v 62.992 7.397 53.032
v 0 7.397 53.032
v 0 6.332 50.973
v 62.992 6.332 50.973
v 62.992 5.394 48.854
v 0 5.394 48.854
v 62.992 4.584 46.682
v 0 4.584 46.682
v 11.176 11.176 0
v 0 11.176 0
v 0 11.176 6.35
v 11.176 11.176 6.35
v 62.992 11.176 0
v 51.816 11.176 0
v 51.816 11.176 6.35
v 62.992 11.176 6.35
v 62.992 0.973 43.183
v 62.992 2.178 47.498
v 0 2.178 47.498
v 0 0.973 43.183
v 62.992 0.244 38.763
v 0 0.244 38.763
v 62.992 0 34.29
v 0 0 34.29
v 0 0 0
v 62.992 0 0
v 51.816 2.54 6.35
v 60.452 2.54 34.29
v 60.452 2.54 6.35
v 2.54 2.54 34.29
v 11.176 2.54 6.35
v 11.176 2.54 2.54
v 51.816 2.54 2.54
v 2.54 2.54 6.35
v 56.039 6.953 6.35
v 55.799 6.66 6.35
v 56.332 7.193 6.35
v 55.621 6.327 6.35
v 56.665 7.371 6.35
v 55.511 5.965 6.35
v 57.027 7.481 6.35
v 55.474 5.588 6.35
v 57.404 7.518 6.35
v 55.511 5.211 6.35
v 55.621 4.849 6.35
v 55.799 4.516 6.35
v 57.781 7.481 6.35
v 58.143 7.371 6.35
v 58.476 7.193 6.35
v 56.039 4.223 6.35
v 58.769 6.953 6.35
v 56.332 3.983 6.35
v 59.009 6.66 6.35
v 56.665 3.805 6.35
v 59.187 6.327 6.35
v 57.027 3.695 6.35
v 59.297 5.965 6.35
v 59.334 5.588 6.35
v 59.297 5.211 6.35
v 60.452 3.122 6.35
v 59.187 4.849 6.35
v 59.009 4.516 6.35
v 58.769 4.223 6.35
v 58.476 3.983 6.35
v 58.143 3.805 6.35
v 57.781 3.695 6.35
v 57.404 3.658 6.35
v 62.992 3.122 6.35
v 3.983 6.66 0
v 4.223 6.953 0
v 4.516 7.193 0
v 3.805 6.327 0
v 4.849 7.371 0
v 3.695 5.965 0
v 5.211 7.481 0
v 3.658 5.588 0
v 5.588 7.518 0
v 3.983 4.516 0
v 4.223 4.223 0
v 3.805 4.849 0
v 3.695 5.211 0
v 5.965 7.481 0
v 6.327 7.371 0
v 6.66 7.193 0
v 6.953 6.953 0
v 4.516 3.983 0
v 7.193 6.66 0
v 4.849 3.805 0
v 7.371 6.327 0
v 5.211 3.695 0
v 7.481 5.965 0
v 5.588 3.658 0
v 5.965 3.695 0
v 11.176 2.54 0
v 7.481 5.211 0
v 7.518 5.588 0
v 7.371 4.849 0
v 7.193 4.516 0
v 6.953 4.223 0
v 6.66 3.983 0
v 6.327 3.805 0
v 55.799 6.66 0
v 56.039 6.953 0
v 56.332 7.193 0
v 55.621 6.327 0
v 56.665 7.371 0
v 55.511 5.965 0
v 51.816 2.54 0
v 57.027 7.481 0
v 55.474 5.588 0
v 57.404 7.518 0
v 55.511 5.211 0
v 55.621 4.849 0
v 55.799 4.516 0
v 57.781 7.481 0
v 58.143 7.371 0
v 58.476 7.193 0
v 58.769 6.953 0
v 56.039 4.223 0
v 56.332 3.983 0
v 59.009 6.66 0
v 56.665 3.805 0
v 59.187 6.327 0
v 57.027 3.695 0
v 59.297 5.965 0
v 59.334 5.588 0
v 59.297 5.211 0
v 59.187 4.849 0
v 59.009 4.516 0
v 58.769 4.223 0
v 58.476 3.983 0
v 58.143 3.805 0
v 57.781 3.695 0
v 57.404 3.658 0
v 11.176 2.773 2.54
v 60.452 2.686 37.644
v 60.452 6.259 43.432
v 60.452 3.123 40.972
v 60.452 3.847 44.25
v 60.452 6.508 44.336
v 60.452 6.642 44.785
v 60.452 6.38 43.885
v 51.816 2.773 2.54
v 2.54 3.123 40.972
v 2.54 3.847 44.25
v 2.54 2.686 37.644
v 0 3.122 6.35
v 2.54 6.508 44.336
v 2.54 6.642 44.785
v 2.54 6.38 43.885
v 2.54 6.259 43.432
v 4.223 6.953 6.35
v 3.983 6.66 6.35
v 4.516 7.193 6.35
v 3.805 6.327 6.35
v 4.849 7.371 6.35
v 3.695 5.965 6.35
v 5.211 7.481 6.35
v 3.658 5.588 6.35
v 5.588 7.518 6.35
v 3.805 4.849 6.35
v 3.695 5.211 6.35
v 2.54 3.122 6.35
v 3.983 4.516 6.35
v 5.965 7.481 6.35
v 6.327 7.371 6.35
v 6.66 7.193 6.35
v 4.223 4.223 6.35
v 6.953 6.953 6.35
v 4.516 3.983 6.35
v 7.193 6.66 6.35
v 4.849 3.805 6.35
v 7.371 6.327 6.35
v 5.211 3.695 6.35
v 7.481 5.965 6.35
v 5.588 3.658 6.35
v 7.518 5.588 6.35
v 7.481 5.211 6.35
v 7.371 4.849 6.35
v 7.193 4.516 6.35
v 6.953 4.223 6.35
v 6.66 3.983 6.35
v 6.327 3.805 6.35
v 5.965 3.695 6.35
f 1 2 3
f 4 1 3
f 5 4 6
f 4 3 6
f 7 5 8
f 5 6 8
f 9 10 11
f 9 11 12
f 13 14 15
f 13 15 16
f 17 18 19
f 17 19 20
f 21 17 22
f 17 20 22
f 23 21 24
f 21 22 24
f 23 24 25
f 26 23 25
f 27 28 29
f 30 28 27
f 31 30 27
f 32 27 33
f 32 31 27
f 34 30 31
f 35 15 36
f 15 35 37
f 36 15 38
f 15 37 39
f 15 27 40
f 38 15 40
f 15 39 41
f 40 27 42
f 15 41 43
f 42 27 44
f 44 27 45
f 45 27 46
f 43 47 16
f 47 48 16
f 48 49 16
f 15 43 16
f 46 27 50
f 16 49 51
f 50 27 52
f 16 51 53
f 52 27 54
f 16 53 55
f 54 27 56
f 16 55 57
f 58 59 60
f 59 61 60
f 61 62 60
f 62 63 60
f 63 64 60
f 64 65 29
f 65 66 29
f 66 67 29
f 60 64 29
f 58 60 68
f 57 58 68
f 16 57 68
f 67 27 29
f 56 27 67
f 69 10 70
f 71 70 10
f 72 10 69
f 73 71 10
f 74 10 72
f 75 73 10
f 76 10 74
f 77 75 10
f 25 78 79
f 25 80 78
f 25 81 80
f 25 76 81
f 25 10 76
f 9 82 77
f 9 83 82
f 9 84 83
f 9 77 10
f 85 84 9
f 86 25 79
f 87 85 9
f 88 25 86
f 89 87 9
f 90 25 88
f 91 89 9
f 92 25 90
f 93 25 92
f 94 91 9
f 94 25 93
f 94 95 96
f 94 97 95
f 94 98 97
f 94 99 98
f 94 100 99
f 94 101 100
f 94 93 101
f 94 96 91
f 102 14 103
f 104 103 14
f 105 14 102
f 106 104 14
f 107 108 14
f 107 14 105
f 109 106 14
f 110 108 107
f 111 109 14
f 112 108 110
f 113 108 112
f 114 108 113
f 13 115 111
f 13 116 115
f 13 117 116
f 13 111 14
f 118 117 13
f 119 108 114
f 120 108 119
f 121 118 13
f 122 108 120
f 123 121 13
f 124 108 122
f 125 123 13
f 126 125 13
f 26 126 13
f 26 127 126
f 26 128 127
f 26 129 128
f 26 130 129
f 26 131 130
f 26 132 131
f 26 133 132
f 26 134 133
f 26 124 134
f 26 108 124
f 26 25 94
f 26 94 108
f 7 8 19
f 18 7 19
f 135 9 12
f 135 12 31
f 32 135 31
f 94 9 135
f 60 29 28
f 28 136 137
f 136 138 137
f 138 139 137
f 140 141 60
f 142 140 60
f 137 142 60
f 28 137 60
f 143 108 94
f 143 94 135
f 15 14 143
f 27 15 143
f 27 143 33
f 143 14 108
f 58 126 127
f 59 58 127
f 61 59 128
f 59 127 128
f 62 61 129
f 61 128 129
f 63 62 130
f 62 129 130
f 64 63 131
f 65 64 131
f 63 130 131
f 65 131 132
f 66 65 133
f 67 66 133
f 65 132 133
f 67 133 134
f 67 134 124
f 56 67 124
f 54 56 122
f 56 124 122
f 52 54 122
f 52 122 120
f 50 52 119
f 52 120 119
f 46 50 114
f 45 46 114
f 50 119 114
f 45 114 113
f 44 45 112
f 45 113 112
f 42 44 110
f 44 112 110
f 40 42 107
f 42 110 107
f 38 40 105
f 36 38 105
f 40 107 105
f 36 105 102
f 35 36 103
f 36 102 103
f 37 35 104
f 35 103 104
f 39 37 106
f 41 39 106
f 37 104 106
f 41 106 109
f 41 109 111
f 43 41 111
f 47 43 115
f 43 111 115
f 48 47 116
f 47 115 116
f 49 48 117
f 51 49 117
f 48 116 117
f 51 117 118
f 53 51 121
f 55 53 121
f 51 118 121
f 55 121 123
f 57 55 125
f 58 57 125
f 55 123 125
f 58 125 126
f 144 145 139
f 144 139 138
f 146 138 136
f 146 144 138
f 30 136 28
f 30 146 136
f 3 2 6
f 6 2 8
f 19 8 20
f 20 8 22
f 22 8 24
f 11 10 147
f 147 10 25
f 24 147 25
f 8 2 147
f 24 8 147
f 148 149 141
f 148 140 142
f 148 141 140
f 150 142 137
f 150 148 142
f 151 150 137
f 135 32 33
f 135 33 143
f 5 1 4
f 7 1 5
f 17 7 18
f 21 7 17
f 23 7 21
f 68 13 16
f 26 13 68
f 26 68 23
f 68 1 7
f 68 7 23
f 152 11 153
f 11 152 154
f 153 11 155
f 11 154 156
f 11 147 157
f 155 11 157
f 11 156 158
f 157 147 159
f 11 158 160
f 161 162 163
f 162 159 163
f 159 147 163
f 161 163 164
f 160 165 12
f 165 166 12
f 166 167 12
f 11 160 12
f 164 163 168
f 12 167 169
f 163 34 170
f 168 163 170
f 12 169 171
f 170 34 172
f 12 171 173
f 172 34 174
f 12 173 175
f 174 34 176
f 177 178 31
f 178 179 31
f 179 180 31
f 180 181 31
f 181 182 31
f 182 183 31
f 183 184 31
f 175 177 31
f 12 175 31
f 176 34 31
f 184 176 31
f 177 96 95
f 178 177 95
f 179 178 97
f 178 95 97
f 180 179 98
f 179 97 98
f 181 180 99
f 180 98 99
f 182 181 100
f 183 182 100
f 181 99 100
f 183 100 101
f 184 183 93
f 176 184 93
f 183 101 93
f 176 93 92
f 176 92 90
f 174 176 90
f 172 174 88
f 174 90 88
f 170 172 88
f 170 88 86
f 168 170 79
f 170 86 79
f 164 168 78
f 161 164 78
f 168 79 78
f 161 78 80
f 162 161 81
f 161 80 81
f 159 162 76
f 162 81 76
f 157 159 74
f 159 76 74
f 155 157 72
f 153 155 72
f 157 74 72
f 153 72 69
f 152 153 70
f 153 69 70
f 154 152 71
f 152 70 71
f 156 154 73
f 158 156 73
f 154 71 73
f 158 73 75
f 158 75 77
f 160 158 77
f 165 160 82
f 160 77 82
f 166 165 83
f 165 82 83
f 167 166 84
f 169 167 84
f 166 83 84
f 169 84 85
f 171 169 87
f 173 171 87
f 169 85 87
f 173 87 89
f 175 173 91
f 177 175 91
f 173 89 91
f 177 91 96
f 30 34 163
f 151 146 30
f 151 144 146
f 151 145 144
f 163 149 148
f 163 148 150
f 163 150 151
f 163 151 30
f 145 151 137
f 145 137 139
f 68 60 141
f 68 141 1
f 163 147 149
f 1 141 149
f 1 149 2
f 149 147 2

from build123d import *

# Parameters (mm, degrees)
F1_DEPTH = 62.992
F2_T     = -2.54
F3_W     = 11.176
F3_H     = 11.176
F3_R     = 1.9304
F4_DEPTH = 6.35


with BuildPart() as f1:
    # F0 (on Right) → F1 (new body)
    with BuildSketch(Plane.YZ):
        with BuildLine():
            Line((0, 34.29), (0, 0))
            Line((0, 0), (2.54, 0))
            Line((2.54, 0), (2.54, 34.29))
            ThreePointArc((2.54, 34.29), (3.0543819704, 40.5698861973), (4.5838156026, 46.6823646004))
            Line((4.5838156026, 46.6823646004), (2.1783345915, 47.498))
            ThreePointArc((2.1783345915, 47.498), (0.5482373448, 40.9832130848), (0, 34.29))
        make_face()
        with BuildLine():
            Line((2.54, 34.29), (2.54, 0))
            Line((2.54, 0), (7.3968325046, 53.0323646004))
            ThreePointArc((7.3968325046, 53.0323646004), (5.8471852484, 49.920774345), (4.5838156026, 46.6823646004))
            ThreePointArc((4.5838156026, 46.6823646004), (3.0543819704, 40.5698861973), (2.54, 34.29))
        make_face()
    extrude(amount=F1_DEPTH)

    # F2
    f2_openings = [f1.faces().sort_by_distance(p)[0] for p in [
        (31.496, 4.968416, 26.516182),
    ]]
    offset(amount=F2_T, openings=f2_openings, kind=Kind.INTERSECTION)

    # F3 (on face) → F4 (join)
    with BuildSketch(Plane(origin=(0, 0, 0), x_dir=(1, 0, 0), z_dir=(0, 0, -1))):
        with Locations((57.404, -5.588)):
            Rectangle(F3_W, F3_H)
        with Locations((57.404, -5.588)):
            Circle(F3_R, mode=Mode.SUBTRACT)
        with Locations((5.588, -5.588)):
            Rectangle(F3_W, F3_H)
        with Locations((5.588, -5.588)):
            Circle(F3_R, mode=Mode.SUBTRACT)
    extrude(amount=-F4_DEPTH)


solid = f1.part
